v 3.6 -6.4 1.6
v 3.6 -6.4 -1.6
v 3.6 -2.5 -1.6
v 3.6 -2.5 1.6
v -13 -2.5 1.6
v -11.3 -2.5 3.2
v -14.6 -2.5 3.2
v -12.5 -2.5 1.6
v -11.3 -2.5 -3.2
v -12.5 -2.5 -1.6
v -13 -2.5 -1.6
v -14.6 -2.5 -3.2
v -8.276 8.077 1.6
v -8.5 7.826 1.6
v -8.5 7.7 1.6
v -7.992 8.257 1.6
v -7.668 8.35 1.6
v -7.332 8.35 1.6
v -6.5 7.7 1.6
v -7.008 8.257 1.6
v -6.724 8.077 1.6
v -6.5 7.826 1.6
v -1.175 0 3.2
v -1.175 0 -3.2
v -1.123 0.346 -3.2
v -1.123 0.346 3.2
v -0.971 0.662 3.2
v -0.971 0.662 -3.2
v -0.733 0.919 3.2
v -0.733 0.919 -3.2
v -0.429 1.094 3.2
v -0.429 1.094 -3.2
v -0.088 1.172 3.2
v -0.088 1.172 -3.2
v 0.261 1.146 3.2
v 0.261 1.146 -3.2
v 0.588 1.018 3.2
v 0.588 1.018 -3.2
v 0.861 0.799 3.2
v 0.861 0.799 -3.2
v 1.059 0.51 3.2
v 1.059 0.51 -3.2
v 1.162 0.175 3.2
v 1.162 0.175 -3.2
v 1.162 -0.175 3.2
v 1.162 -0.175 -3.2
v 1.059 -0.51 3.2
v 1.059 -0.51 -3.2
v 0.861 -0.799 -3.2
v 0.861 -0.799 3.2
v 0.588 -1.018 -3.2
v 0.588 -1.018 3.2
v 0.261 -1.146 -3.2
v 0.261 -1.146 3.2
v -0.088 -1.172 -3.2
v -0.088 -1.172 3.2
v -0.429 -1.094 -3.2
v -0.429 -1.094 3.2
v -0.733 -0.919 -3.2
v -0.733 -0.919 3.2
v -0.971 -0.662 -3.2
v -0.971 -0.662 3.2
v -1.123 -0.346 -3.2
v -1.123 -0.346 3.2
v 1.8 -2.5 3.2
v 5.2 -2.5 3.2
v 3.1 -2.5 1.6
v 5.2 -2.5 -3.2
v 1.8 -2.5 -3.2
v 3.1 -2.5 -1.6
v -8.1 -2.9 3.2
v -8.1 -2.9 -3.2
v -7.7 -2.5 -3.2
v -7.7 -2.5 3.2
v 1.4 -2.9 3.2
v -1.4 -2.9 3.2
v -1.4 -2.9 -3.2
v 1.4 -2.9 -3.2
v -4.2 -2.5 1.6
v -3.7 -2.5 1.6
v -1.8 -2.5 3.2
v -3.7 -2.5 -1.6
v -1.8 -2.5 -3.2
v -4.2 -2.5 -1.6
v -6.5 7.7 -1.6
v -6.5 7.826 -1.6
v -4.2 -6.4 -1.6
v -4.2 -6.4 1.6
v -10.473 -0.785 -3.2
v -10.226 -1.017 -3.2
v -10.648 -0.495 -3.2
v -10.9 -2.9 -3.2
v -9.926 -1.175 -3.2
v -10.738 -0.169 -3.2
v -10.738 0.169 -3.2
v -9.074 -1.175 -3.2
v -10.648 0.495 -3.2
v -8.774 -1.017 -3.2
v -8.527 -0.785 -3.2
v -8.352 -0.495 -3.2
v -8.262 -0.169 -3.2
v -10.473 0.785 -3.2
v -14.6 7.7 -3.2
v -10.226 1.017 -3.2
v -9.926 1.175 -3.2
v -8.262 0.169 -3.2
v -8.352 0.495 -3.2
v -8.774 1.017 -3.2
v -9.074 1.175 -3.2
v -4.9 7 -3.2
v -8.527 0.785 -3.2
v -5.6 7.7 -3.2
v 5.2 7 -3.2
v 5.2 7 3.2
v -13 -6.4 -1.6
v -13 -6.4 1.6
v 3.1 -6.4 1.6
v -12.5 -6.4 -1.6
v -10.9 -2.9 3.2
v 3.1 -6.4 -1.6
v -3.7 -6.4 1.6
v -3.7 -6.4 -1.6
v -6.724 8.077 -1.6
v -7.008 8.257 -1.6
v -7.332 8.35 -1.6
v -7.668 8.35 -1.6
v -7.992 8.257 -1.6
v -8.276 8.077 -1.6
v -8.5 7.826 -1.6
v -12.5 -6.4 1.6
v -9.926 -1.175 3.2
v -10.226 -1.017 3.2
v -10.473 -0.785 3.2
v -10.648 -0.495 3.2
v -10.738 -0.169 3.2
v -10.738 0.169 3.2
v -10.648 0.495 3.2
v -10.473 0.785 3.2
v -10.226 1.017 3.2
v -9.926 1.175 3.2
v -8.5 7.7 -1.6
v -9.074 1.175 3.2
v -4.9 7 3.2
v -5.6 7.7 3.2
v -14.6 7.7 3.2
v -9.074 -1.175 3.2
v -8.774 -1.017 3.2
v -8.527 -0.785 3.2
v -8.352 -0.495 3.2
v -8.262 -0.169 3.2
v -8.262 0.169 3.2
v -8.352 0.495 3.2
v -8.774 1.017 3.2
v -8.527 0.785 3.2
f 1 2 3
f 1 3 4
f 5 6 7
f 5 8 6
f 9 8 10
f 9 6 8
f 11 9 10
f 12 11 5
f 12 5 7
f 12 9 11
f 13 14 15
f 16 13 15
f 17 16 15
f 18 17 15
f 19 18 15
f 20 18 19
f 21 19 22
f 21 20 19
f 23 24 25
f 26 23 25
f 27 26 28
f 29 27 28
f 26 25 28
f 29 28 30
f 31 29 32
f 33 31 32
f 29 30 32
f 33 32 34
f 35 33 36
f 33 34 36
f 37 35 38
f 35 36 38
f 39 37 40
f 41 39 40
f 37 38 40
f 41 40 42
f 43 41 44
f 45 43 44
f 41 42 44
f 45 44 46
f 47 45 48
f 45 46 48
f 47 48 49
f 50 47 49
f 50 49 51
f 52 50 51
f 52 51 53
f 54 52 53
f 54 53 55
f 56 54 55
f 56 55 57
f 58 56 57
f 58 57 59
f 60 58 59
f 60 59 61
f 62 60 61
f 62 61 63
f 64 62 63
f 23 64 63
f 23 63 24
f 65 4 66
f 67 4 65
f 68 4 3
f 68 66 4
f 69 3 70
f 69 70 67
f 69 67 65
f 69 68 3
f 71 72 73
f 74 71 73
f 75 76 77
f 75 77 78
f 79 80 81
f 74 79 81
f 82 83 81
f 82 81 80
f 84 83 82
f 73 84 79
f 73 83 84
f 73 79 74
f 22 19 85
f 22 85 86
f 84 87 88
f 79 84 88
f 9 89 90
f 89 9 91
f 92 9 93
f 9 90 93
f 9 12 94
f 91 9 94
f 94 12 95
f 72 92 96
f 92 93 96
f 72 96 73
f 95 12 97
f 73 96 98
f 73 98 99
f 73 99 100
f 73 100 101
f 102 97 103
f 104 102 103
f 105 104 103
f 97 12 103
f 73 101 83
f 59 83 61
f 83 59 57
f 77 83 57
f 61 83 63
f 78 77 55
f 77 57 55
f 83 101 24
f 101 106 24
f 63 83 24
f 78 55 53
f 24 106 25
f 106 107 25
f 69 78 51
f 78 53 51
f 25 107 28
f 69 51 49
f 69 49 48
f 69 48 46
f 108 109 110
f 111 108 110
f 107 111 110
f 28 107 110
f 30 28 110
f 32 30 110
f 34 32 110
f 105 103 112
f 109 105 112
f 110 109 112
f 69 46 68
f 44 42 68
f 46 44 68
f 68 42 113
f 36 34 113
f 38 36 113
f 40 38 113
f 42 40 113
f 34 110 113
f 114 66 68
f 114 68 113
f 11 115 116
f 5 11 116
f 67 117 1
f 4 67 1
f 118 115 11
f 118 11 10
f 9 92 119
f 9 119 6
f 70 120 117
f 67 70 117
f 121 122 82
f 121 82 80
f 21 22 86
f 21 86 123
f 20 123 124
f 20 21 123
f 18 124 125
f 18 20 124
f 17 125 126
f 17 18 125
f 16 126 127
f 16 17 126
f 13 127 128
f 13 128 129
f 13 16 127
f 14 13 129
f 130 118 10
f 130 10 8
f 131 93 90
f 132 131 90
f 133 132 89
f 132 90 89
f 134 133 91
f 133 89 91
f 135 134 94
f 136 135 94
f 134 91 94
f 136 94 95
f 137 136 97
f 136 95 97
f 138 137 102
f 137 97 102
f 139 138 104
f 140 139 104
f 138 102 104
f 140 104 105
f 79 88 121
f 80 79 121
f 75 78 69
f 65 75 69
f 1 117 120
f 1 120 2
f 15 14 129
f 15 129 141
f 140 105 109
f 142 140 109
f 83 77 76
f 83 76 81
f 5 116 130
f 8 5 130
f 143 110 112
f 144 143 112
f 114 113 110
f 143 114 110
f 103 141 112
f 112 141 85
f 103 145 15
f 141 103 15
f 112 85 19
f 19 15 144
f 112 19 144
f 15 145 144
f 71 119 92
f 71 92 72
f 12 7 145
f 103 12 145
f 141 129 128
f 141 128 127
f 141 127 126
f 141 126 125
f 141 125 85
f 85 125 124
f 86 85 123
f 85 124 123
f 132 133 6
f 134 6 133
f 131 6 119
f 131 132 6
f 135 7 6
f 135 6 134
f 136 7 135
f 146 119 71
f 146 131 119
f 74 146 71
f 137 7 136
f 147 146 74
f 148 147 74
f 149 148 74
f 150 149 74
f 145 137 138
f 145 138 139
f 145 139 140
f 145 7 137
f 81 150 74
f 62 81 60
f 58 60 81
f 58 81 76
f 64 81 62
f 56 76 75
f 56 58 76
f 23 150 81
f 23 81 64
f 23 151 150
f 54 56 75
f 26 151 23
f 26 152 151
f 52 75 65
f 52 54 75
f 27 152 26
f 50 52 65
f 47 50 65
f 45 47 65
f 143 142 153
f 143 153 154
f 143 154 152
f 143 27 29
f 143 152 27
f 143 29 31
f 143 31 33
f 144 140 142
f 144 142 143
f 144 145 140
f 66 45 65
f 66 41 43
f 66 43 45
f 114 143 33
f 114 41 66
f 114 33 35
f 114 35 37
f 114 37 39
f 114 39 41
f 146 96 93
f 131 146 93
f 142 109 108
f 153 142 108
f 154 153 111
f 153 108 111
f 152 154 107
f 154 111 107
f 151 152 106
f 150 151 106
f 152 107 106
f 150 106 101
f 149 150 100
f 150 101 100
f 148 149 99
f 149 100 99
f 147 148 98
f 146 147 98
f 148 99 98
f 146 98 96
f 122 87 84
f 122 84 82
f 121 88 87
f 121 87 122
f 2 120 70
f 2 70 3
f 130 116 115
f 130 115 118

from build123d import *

# Parameters (mm, degrees)
SKETCH1_W                    = 19.8
SKETCH1_H                    = 10.6
BOSS_EXTRUDE1_DEPTH          = 6.4
SKETCH2_W                    = 10.8
SKETCH2_H                    = 0.7
CUT_EXTRUDE1_DEPTH           = 18.703389506
SKETCH3_W                    = 3.3
SKETCH3_H                    = 0.4
CUT_EXTRUDE2_DEPTH           = 18.703389506
SKETCH4_W                    = 5.9
SKETCH4_H                    = 0.4
CUT_EXTRUDE3_DEPTH           = 18.703389506
SKETCH5_W                    = 3.4
SKETCH5_H                    = 0.4
CUT_EXTRUDE4_DEPTH           = 18.703389506
CUT_EXTRUDE5_DEPTH           = 18.703389506
BOSS_EXTRUDE2_DEPTH          = 3.2
SKETCH8_W                    = 0.5
SKETCH8_H                    = 3.2
BOSS_EXTRUDE3_DEPTH          = 3.9
SKETCH9_W                    = 0.5
SKETCH9_H                    = 3.2
BOSS_EXTRUDE4_DEPTH          = 3.9
SKETCH10_W                   = 0.5
SKETCH10_H                   = 3.2
BOSS_EXTRUDE5_DEPTH          = 3.9
DRAFT1_ANGLE                 = 45
DRAFT2_ANGLE                 = 45
DRAFT3_ANGLE                 = 45
DRAFT4_ANGLE                 = 45
F_2_35_2_35_DIAMETER_HOLE1_D = 2.35


with BuildPart() as part:
    # Sketch1 → Boss-Extrude1 (new body)
    with BuildSketch(Plane.XY.offset(3.2)):
        with Locations((-4.7, 2.4)):
            Rectangle(SKETCH1_W, SKETCH1_H)
    extrude(amount=-BOSS_EXTRUDE1_DEPTH)

    # Sketch2 → Cut-Extrude1 (cut, through all)
    with BuildSketch(Plane(origin=(0, 0, -3.2), x_dir=(-1, 0, 0), z_dir=(0, 0, -1))):
        with Locations((0.2, 7.35)):
            Rectangle(SKETCH2_W, SKETCH2_H)
    extrude(amount=-CUT_EXTRUDE1_DEPTH, mode=Mode.SUBTRACT)

    # Sketch3 → Cut-Extrude2 (cut, through all)
    with BuildSketch(Plane(origin=(0, 0, -3.2), x_dir=(-1, 0, 0), z_dir=(0, 0, -1))):
        with Locations((12.95, -2.7)):
            Rectangle(SKETCH3_W, SKETCH3_H)
    extrude(amount=-CUT_EXTRUDE2_DEPTH, mode=Mode.SUBTRACT)

    # Sketch4 → Cut-Extrude3 (cut, through all)
    with BuildSketch(Plane(origin=(0, 0, -3.2), x_dir=(-1, 0, 0), z_dir=(0, 0, -1))):
        with Locations((4.75, -2.7)):
            Rectangle(SKETCH4_W, SKETCH4_H)
    extrude(amount=-CUT_EXTRUDE3_DEPTH, mode=Mode.SUBTRACT)

    # Sketch5 → Cut-Extrude4 (cut, through all)
    with BuildSketch(Plane(origin=(0, 0, -3.2), x_dir=(-1, 0, 0), z_dir=(0, 0, -1))):
        with Locations((-3.5, -2.7)):
            Rectangle(SKETCH5_W, SKETCH5_H)
    extrude(amount=-CUT_EXTRUDE4_DEPTH, mode=Mode.SUBTRACT)

    # Sketch6 → Cut-Extrude5 (cut, through all)
    with BuildSketch(Plane(origin=(0, 0, -3.2), x_dir=(-1, 0, 0), z_dir=(0, 0, -1))):
        with BuildLine():
            Line((9.073531947, -1.175), (9.926468053, -1.175))
            ThreePointArc((9.926468053, -1.175), (10.75, 0), (9.926468053, 1.175))
            Line((9.926468053, 1.175), (9.073531947, 1.175))
            ThreePointArc((9.073531947, 1.175), (8.25, 0), (9.073531947, -1.175))
        make_face()
    extrude(amount=-CUT_EXTRUDE5_DEPTH, mode=Mode.SUBTRACT)

    # Sketch7 → Boss-Extrude2 (add)
    with BuildSketch(Plane.XY.offset(1.6)):
        with BuildLine():
            Line((-8.5, 7.825612234), (-8.5, 7.7))
            Line((-8.5, 7.7), (-6.5, 7.7))
            Line((-6.5, 7.7), (-6.5, 7.825612234))
            ThreePointArc((-6.5, 7.825612234), (-7.5, 8.362287276), (-8.5, 7.825612234))
        make_face()
    extrude(amount=-BOSS_EXTRUDE2_DEPTH)

    # Sketch8 → Boss-Extrude3 (add)
    with BuildSketch(Plane.XZ.offset(2.5)):
        with Locations((-3.95, 0)):
            Rectangle(SKETCH8_W, SKETCH8_H)
    extrude(amount=BOSS_EXTRUDE3_DEPTH)

    # Sketch9 → Boss-Extrude4 (add)
    with BuildSketch(Plane.XZ.offset(2.5)):
        with Locations((3.35, 0)):
            Rectangle(SKETCH9_W, SKETCH9_H)
    extrude(amount=BOSS_EXTRUDE4_DEPTH)

    # Sketch10 → Boss-Extrude5 (add)
    with BuildSketch(Plane.XZ.offset(2.5)):
        with Locations((-12.75, 0)):
            Rectangle(SKETCH10_W, SKETCH10_H)
    extrude(amount=BOSS_EXTRUDE5_DEPTH)

    # Draft1
    draft1_faces = [part.faces().sort_by_distance(p)[0] for p in [
        (-5.6, 7.35, 0),
    ]]
    draft(draft1_faces, Plane(origin=(5.2, 7.7, -3.2), x_dir=(1, 0, 0), z_dir=(0, 1, 0)), DRAFT1_ANGLE)

    # Draft2
    draft2_faces = [part.faces().sort_by_distance(p)[0] for p in [
        (1.8, -2.7, 0),
    ]]
    draft(draft2_faces, Plane(origin=(1.8, -2.5, 3.2), x_dir=(0, 0, -1), z_dir=(0, -1, 0)), DRAFT2_ANGLE)

    # Draft3
    draft3_faces = [part.faces().sort_by_distance(p)[0] for p in [
        (-11.3, -2.7, 0),
    ]]
    draft(draft3_faces, Plane(origin=(-14.6, -2.5, 3.2), x_dir=(0, 0, -1), z_dir=(0, -1, 0)), DRAFT3_ANGLE)

    # Draft4
    draft4_faces = [part.faces().sort_by_distance(p)[0] for p in [
        (-7.7, -2.7, 0),
        (-1.8, -2.7, 0),
    ]]
    draft(draft4_faces, Plane(origin=(-7.7, -2.5, 3.2), x_dir=(0, 0, -1), z_dir=(0, -1, 0)), DRAFT4_ANGLE)

    # Ø2.35 (2.35) Diameter Hole1 (through all)
    with Locations(Plane.XY.offset(3.2)):
        with Locations((0, 0)):
            Hole(F_2_35_2_35_DIAMETER_HOLE1_D / 2)


solid = part.part
